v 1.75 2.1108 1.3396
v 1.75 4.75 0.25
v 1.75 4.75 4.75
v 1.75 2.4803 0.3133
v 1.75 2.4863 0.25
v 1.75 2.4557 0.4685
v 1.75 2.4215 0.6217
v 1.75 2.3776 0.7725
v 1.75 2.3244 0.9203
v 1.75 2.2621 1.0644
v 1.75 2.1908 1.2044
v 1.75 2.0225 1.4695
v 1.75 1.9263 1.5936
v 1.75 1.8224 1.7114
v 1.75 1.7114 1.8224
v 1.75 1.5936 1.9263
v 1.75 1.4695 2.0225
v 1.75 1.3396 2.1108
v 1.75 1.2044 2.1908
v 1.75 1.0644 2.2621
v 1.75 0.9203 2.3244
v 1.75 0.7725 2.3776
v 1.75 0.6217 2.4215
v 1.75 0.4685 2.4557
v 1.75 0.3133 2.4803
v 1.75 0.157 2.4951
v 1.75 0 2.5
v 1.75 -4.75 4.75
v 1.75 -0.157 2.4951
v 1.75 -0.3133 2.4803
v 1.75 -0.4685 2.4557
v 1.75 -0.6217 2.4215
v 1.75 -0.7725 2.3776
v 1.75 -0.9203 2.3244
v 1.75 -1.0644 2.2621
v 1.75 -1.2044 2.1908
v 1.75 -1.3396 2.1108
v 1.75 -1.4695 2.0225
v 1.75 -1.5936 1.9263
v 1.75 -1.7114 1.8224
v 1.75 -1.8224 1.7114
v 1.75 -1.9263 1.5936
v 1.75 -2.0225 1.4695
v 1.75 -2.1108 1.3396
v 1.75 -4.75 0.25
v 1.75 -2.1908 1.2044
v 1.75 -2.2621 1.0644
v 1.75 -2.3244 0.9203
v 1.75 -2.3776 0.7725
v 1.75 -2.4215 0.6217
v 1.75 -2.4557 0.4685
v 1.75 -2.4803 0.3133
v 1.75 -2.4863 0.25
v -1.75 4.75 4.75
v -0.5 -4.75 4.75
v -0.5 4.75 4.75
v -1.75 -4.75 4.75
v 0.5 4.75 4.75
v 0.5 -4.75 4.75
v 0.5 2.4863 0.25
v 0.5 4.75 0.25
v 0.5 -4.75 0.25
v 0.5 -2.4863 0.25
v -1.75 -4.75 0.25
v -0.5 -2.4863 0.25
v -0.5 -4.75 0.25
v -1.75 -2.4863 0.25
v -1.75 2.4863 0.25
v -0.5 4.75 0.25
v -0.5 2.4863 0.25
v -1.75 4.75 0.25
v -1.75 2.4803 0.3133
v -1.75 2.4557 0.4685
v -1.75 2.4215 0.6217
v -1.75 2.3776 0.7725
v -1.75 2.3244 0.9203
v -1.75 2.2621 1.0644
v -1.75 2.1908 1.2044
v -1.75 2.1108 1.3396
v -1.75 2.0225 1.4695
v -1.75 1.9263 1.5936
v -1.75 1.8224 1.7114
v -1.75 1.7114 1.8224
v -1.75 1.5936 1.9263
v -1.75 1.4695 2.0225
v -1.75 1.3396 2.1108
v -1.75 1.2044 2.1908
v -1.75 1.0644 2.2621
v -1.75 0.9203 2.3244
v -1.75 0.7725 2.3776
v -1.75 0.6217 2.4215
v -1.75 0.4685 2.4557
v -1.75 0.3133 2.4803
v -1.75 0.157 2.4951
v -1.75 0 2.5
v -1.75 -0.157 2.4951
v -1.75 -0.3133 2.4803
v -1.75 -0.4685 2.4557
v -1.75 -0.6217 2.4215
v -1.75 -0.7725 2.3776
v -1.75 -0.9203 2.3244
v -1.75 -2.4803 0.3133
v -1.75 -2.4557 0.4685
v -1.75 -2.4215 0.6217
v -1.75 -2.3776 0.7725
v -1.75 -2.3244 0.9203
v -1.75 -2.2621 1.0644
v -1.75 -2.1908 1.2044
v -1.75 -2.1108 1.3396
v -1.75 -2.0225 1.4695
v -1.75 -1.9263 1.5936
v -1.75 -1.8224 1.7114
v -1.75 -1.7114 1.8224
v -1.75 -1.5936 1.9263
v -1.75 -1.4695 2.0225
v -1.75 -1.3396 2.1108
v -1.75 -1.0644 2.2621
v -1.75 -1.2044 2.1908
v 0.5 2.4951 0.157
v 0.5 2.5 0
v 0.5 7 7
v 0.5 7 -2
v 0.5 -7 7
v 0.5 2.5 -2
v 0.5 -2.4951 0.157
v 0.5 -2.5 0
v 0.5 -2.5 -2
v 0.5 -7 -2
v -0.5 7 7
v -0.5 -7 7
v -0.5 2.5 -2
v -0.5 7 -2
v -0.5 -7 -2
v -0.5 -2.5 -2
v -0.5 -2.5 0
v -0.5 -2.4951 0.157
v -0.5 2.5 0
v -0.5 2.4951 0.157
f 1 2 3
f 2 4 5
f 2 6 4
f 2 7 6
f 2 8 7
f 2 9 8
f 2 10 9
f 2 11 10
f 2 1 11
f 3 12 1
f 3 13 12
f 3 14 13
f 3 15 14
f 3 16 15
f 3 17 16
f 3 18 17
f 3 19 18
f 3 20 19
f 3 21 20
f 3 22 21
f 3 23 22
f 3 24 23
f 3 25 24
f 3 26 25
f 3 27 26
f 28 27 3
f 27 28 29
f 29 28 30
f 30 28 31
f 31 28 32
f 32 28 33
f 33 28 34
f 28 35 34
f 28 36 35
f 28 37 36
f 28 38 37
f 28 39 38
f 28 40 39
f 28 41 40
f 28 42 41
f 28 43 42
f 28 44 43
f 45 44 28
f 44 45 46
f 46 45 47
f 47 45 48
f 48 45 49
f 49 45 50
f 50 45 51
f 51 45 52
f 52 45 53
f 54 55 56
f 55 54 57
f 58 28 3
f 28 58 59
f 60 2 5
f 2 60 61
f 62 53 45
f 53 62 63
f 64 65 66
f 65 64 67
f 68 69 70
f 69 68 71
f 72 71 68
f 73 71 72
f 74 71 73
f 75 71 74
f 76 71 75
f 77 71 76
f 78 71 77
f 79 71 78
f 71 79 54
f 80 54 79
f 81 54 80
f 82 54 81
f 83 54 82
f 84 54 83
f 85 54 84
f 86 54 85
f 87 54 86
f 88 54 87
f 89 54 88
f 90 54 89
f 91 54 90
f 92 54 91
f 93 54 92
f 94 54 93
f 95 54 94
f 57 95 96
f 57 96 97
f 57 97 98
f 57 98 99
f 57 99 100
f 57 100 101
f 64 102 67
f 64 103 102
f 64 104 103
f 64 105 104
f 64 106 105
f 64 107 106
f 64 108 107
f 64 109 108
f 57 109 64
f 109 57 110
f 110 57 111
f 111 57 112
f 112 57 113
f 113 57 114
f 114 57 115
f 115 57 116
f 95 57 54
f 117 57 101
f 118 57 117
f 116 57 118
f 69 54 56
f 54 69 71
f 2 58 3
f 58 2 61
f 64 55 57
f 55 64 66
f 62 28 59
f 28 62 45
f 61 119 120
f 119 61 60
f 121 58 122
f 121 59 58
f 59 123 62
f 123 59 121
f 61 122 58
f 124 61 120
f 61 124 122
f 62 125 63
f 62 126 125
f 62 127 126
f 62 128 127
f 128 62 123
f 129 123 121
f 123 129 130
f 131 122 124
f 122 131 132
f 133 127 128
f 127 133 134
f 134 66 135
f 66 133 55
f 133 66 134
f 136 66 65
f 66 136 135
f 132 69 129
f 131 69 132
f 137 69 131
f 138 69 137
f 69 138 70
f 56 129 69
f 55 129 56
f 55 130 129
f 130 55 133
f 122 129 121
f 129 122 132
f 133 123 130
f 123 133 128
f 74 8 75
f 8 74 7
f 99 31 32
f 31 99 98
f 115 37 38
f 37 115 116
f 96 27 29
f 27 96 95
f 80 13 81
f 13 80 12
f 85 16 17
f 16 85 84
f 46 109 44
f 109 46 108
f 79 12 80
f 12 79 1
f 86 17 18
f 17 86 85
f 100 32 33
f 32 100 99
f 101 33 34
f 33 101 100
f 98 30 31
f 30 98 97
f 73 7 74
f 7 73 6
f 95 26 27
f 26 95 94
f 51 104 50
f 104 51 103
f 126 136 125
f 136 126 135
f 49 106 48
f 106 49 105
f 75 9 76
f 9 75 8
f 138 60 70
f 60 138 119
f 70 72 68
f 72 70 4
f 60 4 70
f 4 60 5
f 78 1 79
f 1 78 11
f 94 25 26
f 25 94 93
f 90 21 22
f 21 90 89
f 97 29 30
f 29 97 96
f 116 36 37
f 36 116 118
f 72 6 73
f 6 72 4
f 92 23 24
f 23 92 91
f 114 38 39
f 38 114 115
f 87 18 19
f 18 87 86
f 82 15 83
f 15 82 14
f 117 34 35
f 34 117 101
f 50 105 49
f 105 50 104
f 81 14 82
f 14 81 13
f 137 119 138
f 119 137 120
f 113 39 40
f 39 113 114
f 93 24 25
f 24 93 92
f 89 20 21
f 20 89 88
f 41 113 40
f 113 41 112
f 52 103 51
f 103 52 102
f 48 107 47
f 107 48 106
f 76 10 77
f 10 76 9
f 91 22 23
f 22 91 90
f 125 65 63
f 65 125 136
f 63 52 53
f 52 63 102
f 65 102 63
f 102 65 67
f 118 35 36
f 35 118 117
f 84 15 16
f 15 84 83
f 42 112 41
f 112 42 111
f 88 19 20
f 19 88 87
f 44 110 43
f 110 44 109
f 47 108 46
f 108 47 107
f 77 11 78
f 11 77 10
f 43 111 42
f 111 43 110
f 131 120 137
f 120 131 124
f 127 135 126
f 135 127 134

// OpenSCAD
len_x = 200; //TODO set correct
len_y = 300;
height = 30;
thickness = 2;

hole_radius = 5;
slot_width = 10;
slot_height = 5;

module slot(){
    difference(){
        translate([0,0,slot_height/2])
        union(){
            cube(size=[2*thickness-0.5, slot_width-0.5, slot_height-0.5], center=true);
            cube(size=[1, slot_width+4, slot_height+4], center=true);
        }
        rotate([0,90,0])
        cylinder(  h=2*thickness, d=hole_radius,$fn=100 , center=true);
        translate([0,0,-hole_radius/2])
        cube(size=[hole_radius, hole_radius, hole_radius], center=true);
    }
}
slot();
